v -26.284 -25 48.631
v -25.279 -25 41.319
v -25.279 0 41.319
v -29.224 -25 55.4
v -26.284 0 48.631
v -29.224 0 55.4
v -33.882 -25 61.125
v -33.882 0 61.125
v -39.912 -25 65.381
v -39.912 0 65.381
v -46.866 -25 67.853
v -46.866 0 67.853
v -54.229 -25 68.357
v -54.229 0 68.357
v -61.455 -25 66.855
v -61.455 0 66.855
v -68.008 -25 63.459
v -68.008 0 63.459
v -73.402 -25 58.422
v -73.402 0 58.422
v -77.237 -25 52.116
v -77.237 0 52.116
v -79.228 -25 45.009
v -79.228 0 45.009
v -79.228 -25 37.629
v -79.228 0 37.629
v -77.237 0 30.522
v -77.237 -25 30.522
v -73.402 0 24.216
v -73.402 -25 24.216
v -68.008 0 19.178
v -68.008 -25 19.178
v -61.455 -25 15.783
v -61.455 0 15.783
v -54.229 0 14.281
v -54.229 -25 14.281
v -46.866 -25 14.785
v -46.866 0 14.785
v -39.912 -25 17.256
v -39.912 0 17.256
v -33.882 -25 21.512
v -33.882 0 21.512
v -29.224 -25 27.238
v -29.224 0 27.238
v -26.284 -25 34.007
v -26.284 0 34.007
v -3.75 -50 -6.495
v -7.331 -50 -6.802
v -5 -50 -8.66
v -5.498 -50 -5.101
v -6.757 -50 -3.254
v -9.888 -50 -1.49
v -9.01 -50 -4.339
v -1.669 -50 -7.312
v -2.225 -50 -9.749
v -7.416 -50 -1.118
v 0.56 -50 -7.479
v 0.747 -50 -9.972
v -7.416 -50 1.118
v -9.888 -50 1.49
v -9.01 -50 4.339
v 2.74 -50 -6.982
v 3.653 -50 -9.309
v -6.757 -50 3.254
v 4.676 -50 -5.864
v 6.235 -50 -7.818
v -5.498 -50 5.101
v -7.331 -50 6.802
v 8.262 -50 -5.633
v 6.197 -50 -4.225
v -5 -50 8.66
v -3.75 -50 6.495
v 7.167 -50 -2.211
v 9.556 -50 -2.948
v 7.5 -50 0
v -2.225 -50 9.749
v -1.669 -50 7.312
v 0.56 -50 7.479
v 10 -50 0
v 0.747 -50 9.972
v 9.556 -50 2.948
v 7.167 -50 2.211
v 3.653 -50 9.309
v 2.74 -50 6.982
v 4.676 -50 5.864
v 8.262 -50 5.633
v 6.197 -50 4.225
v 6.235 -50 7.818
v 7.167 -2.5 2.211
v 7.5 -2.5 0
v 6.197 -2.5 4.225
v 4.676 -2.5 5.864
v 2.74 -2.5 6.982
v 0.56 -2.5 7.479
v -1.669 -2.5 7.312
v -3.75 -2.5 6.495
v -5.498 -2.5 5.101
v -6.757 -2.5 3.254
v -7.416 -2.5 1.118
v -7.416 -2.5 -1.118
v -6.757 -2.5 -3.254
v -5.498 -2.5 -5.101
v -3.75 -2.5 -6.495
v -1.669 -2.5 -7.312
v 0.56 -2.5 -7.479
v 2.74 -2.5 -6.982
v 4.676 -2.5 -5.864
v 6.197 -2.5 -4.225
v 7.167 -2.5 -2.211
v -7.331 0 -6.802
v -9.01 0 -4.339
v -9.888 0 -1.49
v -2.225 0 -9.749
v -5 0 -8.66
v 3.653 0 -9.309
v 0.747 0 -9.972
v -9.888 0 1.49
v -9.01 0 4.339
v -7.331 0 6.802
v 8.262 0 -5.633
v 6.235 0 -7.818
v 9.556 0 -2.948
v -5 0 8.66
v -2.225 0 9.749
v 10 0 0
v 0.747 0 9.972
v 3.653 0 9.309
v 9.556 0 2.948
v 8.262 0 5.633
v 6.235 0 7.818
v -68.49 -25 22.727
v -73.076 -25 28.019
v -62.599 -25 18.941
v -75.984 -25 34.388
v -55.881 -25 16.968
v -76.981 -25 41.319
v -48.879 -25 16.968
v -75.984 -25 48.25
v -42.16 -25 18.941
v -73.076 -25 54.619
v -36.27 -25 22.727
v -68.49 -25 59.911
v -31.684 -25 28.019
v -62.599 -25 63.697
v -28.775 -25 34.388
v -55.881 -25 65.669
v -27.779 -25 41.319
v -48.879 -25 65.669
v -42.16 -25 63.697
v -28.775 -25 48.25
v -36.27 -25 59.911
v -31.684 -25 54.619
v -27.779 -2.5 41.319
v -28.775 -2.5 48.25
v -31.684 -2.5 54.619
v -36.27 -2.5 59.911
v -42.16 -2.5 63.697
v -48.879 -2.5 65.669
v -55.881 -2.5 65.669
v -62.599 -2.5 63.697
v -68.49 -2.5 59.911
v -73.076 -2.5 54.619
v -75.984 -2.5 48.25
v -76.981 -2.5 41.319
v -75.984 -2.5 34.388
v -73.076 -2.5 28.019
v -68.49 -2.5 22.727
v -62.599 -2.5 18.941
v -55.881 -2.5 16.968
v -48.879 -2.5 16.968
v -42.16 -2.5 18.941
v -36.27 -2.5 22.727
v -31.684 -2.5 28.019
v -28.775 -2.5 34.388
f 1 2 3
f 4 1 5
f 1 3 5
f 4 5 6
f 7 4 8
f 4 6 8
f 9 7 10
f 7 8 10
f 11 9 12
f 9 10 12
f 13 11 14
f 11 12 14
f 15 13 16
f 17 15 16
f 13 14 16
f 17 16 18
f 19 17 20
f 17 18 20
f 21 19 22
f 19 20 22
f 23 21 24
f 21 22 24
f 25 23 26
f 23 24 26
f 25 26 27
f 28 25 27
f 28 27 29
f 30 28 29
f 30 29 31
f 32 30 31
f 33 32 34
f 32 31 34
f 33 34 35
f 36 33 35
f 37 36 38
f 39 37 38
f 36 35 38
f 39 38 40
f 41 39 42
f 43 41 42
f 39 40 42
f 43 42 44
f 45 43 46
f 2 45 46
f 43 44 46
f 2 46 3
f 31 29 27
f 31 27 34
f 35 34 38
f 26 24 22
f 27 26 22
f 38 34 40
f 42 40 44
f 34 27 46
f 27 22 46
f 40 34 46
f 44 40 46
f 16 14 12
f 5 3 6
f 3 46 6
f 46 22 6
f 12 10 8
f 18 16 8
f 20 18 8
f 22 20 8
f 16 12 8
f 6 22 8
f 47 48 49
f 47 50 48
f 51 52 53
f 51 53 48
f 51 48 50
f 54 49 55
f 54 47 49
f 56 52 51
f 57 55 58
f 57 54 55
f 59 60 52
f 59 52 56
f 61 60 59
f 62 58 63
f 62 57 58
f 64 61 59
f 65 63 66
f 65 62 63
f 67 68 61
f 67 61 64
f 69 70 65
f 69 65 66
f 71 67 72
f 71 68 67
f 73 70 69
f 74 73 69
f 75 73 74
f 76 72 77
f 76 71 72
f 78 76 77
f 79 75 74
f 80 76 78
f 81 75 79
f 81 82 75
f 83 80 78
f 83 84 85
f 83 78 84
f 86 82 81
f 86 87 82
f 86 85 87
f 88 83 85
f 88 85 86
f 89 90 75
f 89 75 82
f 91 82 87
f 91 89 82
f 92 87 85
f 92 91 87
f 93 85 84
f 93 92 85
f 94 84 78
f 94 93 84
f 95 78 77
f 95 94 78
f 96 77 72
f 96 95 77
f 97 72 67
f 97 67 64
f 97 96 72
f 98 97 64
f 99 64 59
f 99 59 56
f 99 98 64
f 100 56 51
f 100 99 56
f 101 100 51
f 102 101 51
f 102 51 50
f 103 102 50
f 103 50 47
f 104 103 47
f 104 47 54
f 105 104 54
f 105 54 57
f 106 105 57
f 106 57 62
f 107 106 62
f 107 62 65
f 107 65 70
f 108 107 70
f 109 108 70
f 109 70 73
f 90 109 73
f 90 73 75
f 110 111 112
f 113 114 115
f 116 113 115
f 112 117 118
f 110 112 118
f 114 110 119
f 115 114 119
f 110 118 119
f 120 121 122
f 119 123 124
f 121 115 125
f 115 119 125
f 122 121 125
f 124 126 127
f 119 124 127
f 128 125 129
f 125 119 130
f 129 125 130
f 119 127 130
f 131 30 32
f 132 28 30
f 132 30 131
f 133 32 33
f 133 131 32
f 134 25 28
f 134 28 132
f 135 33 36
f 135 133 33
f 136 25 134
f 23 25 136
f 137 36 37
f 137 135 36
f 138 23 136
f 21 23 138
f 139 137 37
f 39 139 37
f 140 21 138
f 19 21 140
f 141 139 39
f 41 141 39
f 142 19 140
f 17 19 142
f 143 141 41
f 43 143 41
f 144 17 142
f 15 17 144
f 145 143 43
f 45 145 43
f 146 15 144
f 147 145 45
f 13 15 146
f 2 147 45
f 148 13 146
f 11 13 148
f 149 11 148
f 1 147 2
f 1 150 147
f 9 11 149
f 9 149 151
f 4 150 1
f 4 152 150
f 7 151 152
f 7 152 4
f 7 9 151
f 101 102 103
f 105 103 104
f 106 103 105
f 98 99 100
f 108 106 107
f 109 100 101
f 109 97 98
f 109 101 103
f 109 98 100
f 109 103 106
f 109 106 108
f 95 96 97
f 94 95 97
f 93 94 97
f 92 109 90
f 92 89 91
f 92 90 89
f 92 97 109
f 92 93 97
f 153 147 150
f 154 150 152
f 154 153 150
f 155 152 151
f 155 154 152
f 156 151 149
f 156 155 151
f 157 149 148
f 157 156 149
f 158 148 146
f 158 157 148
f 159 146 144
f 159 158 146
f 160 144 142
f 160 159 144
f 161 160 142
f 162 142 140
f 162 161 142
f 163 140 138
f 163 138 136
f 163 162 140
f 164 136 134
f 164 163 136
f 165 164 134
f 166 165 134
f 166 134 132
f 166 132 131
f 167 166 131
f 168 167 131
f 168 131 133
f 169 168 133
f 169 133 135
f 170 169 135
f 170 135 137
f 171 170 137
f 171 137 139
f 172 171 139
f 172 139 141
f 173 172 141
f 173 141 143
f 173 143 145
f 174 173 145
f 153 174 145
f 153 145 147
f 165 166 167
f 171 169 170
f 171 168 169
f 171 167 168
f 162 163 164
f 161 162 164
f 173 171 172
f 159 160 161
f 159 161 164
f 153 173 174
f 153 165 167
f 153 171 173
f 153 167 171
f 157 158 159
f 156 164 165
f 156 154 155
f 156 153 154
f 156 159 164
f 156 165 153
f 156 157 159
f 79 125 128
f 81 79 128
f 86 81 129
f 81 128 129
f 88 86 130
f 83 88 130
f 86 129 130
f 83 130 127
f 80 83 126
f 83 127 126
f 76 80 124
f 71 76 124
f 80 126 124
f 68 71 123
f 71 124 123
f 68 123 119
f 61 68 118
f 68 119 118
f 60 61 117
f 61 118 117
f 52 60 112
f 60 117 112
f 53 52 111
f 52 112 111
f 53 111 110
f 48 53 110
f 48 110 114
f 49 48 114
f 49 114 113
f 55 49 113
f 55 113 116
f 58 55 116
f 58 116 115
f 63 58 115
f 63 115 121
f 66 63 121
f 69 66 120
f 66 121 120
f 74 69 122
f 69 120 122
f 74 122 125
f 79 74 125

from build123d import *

# Parameters (mm, degrees)
F5_R     = 10
F0_DEPTH = 50
F1_R     = 27.100928
F2_DEPTH = 25
F3_T     = -2.5
F4_T     = -2.5


with BuildPart() as f0:
    # F5 (on Front) → F0 (new body)
    with BuildSketch(Plane.XZ):
        Circle(F5_R)
    extrude(amount=F0_DEPTH)

    # F3
    f3_openings = [f0.faces().sort_by_distance(p)[0] for p in [
        (0, -50, 0),
    ]]
    offset(amount=F3_T, openings=f3_openings)


with BuildPart() as f2:
    # F1 (on Front) → F2 (new body)
    with BuildSketch(Plane.XZ):
        with Locations((-52.379899, 41.318815)):
            Circle(F1_R)
    extrude(amount=F2_DEPTH)

    # F4
    f4_openings = [f2.faces().sort_by_distance(p)[0] for p in [
        (-52.379899, -25, 41.318815),
    ]]
    offset(amount=F4_T, openings=f4_openings)


solid = Compound([f0.part, f2.part])
